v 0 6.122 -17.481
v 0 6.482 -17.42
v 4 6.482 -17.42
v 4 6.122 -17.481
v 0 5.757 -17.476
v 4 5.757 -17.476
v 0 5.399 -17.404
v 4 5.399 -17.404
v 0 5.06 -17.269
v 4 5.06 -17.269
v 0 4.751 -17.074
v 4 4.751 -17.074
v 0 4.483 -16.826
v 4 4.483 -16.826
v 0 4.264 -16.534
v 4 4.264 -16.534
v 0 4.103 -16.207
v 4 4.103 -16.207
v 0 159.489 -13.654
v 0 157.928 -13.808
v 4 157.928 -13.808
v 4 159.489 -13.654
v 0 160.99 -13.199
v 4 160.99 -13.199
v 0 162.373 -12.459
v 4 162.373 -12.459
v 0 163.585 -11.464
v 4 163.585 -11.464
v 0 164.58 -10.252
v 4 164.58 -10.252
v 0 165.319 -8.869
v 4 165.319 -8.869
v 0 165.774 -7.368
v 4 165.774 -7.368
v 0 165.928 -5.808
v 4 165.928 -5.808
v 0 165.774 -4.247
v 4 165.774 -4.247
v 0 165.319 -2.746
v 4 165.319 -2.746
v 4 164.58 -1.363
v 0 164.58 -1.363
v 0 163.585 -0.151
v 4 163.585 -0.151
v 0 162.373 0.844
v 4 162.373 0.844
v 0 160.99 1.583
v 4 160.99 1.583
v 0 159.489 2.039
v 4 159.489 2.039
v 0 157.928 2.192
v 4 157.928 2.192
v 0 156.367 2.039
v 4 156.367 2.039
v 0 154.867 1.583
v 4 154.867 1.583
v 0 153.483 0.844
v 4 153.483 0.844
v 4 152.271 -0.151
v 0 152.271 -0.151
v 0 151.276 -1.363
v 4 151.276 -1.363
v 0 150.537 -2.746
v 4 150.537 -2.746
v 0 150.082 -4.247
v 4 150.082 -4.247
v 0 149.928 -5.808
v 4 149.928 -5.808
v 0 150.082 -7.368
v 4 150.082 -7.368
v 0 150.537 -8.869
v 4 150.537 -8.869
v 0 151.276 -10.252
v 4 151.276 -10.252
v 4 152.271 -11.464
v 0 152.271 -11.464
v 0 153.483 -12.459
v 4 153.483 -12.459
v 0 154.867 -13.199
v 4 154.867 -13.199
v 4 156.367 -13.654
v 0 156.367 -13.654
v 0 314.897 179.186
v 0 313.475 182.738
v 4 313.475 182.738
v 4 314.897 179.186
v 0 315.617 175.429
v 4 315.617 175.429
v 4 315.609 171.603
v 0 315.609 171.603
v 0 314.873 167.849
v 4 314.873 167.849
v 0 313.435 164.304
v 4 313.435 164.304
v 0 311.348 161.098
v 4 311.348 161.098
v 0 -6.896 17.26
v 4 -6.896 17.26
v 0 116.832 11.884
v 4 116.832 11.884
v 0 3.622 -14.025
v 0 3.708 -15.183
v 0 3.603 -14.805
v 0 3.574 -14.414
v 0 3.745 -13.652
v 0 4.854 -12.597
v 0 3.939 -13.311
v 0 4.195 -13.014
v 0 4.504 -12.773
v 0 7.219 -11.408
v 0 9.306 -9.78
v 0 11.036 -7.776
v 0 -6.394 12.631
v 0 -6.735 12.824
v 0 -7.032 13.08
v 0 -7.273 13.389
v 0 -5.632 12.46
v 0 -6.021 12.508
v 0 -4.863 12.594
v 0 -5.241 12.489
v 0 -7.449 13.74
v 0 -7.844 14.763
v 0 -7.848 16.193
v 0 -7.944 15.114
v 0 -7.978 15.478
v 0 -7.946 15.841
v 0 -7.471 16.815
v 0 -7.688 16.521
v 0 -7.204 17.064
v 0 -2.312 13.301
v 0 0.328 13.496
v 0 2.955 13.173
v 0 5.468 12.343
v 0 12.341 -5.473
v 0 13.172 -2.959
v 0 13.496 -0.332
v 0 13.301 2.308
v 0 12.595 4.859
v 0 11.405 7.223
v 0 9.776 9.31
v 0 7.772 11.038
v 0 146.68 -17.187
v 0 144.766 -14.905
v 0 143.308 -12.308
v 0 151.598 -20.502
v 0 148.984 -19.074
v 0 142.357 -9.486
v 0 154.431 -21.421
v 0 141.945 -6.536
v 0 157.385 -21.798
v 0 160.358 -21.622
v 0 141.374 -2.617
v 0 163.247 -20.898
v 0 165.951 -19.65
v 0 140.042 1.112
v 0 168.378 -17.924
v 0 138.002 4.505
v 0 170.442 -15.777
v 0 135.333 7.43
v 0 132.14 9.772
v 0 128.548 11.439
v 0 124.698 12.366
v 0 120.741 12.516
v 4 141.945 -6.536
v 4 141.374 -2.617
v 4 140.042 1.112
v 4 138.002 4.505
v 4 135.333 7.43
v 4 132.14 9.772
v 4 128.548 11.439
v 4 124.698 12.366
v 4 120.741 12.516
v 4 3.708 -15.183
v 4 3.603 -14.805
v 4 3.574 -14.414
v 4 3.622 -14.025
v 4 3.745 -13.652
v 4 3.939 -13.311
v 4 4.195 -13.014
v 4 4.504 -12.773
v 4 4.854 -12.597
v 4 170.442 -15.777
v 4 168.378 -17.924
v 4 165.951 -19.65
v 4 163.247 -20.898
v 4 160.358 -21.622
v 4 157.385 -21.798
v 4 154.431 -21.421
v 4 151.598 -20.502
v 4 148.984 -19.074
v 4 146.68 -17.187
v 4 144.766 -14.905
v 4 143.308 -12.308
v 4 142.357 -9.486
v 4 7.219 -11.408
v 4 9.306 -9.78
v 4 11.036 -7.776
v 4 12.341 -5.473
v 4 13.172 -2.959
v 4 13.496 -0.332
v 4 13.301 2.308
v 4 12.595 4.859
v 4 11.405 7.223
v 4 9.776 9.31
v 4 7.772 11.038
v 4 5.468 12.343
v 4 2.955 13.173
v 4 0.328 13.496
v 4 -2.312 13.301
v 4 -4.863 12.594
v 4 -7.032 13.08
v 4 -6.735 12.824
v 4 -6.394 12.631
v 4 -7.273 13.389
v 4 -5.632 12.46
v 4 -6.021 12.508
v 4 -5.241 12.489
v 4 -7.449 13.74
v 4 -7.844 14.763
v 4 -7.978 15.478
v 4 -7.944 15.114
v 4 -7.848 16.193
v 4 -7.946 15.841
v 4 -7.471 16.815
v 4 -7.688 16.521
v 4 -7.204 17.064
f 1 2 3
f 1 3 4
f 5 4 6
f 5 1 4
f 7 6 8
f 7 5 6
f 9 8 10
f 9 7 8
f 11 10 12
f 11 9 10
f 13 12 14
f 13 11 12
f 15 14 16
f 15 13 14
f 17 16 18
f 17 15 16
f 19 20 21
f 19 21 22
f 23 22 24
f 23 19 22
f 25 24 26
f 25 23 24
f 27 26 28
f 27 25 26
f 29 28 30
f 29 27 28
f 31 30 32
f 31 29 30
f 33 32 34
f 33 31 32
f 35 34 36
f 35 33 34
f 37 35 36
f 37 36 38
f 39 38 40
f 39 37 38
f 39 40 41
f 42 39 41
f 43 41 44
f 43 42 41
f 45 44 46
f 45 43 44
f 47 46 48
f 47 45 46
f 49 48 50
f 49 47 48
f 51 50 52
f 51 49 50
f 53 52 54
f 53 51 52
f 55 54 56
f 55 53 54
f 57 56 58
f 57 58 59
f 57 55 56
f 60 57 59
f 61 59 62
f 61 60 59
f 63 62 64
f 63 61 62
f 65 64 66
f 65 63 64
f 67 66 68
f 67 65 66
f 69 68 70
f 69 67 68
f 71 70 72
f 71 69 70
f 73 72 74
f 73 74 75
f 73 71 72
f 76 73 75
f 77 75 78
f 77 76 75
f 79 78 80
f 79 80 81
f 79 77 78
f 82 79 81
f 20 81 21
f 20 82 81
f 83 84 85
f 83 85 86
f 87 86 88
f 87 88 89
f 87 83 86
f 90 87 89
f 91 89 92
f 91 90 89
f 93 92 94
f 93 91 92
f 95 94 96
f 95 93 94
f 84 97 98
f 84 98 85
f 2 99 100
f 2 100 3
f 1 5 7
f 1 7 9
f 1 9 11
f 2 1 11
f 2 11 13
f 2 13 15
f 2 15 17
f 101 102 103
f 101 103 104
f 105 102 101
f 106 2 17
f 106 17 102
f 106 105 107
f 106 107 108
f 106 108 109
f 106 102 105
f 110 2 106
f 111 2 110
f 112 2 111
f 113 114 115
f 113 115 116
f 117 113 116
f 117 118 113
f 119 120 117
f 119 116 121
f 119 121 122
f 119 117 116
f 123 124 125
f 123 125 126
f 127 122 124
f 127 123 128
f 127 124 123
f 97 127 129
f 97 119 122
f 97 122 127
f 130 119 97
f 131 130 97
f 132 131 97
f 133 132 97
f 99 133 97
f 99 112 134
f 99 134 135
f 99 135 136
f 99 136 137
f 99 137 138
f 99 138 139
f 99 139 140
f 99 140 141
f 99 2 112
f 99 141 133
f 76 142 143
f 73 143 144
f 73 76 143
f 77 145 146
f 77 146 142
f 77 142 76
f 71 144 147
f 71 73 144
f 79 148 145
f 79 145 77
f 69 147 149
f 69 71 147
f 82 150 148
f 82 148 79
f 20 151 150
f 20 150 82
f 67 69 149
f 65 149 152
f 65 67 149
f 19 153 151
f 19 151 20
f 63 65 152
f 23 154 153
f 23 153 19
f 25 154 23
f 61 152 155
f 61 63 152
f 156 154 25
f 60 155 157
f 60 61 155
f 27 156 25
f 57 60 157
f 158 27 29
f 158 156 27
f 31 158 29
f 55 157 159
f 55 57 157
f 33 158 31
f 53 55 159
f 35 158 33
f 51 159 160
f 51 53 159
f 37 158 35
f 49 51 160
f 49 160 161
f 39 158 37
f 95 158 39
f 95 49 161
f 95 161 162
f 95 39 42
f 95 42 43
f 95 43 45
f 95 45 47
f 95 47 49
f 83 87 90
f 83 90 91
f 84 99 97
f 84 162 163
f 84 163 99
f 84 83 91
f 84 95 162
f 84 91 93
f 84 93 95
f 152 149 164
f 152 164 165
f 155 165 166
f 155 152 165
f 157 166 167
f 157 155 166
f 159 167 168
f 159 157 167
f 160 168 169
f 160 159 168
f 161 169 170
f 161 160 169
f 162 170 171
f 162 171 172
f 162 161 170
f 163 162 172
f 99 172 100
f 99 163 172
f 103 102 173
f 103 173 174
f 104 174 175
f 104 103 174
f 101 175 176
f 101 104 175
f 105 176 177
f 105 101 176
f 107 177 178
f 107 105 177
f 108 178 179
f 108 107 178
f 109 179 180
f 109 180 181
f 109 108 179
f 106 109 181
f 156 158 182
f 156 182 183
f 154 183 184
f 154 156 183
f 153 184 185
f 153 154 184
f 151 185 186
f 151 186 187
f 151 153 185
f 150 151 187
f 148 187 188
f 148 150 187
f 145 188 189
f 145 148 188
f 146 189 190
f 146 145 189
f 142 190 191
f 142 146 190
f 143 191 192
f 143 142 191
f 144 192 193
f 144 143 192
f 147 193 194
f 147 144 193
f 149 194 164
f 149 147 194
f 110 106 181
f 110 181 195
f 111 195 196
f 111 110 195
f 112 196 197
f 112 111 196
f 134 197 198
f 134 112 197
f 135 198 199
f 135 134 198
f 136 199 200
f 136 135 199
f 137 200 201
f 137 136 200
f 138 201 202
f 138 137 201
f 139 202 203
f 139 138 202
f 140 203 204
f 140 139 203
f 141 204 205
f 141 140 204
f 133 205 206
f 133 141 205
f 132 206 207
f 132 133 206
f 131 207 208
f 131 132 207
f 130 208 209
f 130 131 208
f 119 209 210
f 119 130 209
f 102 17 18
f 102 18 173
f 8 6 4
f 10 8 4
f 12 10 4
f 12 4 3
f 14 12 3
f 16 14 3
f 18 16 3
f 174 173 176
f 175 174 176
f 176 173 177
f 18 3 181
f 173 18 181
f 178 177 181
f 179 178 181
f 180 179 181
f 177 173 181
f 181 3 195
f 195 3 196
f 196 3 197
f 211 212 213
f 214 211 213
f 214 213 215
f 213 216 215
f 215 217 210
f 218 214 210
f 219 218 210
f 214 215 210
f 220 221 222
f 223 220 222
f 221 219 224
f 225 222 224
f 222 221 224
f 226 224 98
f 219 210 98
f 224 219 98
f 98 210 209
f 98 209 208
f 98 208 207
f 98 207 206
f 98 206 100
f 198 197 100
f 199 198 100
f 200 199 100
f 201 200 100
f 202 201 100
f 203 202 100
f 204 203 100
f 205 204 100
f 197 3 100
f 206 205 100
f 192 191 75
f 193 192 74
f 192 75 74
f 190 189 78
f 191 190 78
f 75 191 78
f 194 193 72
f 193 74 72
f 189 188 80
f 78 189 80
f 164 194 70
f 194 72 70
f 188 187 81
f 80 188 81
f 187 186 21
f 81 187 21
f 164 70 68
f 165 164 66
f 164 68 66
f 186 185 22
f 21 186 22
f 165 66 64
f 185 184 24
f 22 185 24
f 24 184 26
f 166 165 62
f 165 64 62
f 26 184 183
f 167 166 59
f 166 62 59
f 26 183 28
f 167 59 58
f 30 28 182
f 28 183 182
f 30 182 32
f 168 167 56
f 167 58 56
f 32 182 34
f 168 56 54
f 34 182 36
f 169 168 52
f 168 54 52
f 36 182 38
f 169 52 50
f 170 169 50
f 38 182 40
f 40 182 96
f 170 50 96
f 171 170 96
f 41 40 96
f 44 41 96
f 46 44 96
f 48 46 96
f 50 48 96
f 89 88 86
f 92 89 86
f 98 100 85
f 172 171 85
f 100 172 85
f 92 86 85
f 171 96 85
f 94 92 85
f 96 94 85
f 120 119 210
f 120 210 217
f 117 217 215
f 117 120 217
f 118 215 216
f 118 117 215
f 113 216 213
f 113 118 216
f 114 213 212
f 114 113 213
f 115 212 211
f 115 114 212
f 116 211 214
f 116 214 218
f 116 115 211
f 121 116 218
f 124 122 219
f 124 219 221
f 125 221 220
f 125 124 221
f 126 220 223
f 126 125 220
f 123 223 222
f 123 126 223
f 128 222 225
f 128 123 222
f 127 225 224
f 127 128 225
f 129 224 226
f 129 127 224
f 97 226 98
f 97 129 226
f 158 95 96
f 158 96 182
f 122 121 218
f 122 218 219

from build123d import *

# Parameters (mm, degrees)
SKETCH_1_R             = 8
SM_BASE_FLANGE_1_DEPTH = 4


# Sheet-metal steps are written as plain solids
with BuildPart() as part:
    # Sketch 1 → Базовая кромка1 (new body)
    with BuildSketch(Plane(origin=(0, 0, 0), x_dir=(0, 0, -1), z_dir=(1, 0, 0))):
        with BuildLine():
            Line((-161.097577427, 311.348014413), (15.777028295, 170.442439889))
            ThreePointArc((15.777028295, 170.442439889), (21.027340211, 152.992649587), (6.535875187, 141.944645322))
            ThreePointArc((6.535875187, 141.944645322), (-8.680633455, 133.794281683), (-11.883786143, 116.832254223))
            Line((-11.883786143, 116.832254223), (17.41991669, 6.481832542))
            ThreePointArc((17.41991669, 6.481832542), (17.268656425, 5.060014039), (16.206724964, 4.102543887))
            Line((16.206724964, 4.102543887), (15.1830333, 3.707647452))
            ThreePointArc((15.1830333, 3.707647452), (13.65244827, 3.7453323), (12.596997586, 4.854446603))
            ThreePointArc((12.596997586, 4.854446603), (-4.858743487, 12.595340874), (-12.593682696, -4.863039806))
            ThreePointArc((-12.593682696, -4.863039806), (-12.630845419, -6.393637603), (-13.739599615, -7.449466574))
            Line((-13.739599615, -7.449466574), (-14.763291279, -7.844363009))
            ThreePointArc((-14.763291279, -7.844363009), (-16.19312815, -7.848110442), (-17.26006382, -6.896219798))
            Line((-17.26006382, -6.896219798), (-182.737745394, 313.474626916))
            ThreePointArc((-182.737745394, 313.474626916), (-171.603404739, 315.609160958), (-161.097577427, 311.348014413))
        make_face()
        with Locations((5.807559646, 157.928060366)):
            Circle(SKETCH_1_R, mode=Mode.SUBTRACT)
    extrude(amount=SM_BASE_FLANGE_1_DEPTH)


solid = part.part
